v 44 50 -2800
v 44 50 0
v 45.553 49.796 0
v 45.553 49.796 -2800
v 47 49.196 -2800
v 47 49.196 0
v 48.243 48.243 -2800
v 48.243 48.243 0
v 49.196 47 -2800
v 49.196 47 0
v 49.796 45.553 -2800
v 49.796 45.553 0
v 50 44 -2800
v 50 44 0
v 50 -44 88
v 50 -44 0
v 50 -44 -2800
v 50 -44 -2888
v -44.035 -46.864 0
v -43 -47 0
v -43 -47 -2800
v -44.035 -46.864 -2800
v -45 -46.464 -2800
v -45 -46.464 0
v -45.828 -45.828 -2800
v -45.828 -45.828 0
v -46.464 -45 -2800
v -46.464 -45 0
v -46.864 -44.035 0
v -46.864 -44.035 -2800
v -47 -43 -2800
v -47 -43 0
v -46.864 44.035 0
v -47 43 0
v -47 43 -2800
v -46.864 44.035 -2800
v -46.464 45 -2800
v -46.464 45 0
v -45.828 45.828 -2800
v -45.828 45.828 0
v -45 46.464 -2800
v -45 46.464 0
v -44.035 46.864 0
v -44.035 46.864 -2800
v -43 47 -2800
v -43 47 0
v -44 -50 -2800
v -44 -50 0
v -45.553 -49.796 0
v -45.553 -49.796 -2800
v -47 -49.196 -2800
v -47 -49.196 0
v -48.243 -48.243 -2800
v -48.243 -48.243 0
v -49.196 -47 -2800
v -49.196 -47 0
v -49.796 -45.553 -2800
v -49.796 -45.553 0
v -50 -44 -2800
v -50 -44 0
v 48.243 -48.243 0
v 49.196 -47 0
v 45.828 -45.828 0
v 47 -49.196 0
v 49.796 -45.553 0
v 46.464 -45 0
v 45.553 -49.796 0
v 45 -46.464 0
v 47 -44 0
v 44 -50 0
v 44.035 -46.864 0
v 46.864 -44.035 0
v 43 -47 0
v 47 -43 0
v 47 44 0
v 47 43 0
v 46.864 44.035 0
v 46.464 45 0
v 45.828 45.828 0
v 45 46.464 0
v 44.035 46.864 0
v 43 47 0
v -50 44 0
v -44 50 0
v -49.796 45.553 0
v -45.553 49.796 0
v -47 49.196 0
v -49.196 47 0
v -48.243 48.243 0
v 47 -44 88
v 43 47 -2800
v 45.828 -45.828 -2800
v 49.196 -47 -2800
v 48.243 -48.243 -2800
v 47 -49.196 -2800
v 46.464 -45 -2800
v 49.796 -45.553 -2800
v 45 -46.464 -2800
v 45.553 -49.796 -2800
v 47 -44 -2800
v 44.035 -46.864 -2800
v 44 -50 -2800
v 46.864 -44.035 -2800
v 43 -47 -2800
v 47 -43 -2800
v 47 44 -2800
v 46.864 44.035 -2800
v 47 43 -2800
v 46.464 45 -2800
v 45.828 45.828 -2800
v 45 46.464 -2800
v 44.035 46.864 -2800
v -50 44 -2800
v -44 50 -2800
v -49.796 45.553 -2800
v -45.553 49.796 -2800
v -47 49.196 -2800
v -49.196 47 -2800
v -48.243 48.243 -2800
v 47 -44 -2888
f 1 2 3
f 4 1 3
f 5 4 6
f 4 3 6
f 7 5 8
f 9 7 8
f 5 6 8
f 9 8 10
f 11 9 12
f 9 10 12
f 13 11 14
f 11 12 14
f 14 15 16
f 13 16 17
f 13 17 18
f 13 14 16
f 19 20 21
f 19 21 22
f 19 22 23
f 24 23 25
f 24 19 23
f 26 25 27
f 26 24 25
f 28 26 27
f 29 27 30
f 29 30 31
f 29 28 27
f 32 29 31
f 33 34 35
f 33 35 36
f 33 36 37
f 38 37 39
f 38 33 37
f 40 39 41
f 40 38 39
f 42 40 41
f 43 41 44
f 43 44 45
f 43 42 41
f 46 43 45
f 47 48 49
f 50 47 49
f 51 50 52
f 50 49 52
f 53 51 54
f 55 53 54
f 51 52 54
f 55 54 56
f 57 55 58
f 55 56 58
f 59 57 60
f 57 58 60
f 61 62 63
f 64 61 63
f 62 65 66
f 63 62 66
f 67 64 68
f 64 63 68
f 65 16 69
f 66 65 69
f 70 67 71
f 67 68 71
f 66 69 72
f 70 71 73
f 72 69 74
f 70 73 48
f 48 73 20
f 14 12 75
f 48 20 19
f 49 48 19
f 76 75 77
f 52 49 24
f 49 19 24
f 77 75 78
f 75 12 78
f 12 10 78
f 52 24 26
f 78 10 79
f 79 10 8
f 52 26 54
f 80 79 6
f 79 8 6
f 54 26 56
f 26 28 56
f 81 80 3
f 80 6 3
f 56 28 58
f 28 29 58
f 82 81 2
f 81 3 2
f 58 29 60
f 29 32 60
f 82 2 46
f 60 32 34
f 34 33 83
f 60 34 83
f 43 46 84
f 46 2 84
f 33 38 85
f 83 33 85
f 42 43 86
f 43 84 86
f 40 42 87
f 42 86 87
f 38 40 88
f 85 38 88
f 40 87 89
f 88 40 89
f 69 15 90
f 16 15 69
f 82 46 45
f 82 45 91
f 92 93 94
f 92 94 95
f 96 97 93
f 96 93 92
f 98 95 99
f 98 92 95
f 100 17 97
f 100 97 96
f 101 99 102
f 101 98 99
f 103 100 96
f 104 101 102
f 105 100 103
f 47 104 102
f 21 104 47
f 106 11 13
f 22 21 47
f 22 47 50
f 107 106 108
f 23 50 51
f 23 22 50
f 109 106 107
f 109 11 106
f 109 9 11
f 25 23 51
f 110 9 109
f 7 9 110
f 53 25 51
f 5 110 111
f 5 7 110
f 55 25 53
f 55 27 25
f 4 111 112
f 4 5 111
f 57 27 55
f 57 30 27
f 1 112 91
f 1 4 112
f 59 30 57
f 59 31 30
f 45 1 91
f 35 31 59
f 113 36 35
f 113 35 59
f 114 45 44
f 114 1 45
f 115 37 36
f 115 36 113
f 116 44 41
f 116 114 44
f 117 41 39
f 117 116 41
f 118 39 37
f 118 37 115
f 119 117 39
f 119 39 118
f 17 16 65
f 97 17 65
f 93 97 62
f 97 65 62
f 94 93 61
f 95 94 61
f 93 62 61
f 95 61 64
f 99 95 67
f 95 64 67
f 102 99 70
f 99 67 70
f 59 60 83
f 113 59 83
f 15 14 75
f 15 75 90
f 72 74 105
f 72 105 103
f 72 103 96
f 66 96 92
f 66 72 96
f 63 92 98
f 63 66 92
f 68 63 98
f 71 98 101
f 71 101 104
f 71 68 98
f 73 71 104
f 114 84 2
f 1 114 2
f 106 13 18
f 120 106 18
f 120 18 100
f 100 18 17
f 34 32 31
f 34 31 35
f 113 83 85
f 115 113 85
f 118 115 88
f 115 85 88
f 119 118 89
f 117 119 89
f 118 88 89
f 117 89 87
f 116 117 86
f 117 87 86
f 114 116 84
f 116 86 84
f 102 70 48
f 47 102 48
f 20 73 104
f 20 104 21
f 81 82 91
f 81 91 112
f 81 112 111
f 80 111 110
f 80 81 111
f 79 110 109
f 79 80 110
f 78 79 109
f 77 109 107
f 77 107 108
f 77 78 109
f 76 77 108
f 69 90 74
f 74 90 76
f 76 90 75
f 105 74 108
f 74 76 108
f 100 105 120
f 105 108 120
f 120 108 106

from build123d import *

# Parameters (mm, degrees)
EXTRUDE_1_DEPTH = 2800
EXTRUDE_2_DEPTH = 3


with BuildPart() as part:
    # Эскиз1 → Бобышка-Вытянуть1 (new body)
    with BuildSketch(Plane.XY):
        with BuildLine():
            Line((-44, 50), (44, 50))
            ThreePointArc((44, 50), (48.242640687, 48.242640687), (50, 44))
            Line((50, 44), (50, -44))
            ThreePointArc((50, -44), (48.242640687, -48.242640687), (44, -50))
            Line((44, -50), (-44, -50))
            ThreePointArc((-44, -50), (-48.242640687, -48.242640687), (-50, -44))
            Line((-50, -44), (-50, 44))
            ThreePointArc((-50, 44), (-48.242640687, 48.242640687), (-44, 50))
        make_face()
        with BuildLine():
            Line((-43, 47), (43, 47))
            ThreePointArc((43, 47), (45.828427125, 45.828427125), (47, 43))
            Line((47, 43), (47, -43))
            ThreePointArc((47, -43), (45.828427125, -45.828427125), (43, -47))
            Line((43, -47), (-43, -47))
            ThreePointArc((-43, -47), (-45.828427125, -45.828427125), (-47, -43))
            Line((-47, -43), (-47, 43))
            ThreePointArc((-47, 43), (-45.828427125, 45.828427125), (-43, 47))
        make_face(mode=Mode.SUBTRACT)
    extrude(amount=-EXTRUDE_1_DEPTH)

    # Эскиз2 → Бобышка-Вытянуть2 (add)
    with BuildSketch(Plane(origin=(50, 0, 0), x_dir=(0, 0, -1), z_dir=(1, 0, 0))):
        Polygon((0, -44), (0, 44), (-88, -44), align=None)
        Polygon((2800, -44), (2800, 44), (2888, -44), align=None)
    extrude(amount=-EXTRUDE_2_DEPTH)


solid = part.part
